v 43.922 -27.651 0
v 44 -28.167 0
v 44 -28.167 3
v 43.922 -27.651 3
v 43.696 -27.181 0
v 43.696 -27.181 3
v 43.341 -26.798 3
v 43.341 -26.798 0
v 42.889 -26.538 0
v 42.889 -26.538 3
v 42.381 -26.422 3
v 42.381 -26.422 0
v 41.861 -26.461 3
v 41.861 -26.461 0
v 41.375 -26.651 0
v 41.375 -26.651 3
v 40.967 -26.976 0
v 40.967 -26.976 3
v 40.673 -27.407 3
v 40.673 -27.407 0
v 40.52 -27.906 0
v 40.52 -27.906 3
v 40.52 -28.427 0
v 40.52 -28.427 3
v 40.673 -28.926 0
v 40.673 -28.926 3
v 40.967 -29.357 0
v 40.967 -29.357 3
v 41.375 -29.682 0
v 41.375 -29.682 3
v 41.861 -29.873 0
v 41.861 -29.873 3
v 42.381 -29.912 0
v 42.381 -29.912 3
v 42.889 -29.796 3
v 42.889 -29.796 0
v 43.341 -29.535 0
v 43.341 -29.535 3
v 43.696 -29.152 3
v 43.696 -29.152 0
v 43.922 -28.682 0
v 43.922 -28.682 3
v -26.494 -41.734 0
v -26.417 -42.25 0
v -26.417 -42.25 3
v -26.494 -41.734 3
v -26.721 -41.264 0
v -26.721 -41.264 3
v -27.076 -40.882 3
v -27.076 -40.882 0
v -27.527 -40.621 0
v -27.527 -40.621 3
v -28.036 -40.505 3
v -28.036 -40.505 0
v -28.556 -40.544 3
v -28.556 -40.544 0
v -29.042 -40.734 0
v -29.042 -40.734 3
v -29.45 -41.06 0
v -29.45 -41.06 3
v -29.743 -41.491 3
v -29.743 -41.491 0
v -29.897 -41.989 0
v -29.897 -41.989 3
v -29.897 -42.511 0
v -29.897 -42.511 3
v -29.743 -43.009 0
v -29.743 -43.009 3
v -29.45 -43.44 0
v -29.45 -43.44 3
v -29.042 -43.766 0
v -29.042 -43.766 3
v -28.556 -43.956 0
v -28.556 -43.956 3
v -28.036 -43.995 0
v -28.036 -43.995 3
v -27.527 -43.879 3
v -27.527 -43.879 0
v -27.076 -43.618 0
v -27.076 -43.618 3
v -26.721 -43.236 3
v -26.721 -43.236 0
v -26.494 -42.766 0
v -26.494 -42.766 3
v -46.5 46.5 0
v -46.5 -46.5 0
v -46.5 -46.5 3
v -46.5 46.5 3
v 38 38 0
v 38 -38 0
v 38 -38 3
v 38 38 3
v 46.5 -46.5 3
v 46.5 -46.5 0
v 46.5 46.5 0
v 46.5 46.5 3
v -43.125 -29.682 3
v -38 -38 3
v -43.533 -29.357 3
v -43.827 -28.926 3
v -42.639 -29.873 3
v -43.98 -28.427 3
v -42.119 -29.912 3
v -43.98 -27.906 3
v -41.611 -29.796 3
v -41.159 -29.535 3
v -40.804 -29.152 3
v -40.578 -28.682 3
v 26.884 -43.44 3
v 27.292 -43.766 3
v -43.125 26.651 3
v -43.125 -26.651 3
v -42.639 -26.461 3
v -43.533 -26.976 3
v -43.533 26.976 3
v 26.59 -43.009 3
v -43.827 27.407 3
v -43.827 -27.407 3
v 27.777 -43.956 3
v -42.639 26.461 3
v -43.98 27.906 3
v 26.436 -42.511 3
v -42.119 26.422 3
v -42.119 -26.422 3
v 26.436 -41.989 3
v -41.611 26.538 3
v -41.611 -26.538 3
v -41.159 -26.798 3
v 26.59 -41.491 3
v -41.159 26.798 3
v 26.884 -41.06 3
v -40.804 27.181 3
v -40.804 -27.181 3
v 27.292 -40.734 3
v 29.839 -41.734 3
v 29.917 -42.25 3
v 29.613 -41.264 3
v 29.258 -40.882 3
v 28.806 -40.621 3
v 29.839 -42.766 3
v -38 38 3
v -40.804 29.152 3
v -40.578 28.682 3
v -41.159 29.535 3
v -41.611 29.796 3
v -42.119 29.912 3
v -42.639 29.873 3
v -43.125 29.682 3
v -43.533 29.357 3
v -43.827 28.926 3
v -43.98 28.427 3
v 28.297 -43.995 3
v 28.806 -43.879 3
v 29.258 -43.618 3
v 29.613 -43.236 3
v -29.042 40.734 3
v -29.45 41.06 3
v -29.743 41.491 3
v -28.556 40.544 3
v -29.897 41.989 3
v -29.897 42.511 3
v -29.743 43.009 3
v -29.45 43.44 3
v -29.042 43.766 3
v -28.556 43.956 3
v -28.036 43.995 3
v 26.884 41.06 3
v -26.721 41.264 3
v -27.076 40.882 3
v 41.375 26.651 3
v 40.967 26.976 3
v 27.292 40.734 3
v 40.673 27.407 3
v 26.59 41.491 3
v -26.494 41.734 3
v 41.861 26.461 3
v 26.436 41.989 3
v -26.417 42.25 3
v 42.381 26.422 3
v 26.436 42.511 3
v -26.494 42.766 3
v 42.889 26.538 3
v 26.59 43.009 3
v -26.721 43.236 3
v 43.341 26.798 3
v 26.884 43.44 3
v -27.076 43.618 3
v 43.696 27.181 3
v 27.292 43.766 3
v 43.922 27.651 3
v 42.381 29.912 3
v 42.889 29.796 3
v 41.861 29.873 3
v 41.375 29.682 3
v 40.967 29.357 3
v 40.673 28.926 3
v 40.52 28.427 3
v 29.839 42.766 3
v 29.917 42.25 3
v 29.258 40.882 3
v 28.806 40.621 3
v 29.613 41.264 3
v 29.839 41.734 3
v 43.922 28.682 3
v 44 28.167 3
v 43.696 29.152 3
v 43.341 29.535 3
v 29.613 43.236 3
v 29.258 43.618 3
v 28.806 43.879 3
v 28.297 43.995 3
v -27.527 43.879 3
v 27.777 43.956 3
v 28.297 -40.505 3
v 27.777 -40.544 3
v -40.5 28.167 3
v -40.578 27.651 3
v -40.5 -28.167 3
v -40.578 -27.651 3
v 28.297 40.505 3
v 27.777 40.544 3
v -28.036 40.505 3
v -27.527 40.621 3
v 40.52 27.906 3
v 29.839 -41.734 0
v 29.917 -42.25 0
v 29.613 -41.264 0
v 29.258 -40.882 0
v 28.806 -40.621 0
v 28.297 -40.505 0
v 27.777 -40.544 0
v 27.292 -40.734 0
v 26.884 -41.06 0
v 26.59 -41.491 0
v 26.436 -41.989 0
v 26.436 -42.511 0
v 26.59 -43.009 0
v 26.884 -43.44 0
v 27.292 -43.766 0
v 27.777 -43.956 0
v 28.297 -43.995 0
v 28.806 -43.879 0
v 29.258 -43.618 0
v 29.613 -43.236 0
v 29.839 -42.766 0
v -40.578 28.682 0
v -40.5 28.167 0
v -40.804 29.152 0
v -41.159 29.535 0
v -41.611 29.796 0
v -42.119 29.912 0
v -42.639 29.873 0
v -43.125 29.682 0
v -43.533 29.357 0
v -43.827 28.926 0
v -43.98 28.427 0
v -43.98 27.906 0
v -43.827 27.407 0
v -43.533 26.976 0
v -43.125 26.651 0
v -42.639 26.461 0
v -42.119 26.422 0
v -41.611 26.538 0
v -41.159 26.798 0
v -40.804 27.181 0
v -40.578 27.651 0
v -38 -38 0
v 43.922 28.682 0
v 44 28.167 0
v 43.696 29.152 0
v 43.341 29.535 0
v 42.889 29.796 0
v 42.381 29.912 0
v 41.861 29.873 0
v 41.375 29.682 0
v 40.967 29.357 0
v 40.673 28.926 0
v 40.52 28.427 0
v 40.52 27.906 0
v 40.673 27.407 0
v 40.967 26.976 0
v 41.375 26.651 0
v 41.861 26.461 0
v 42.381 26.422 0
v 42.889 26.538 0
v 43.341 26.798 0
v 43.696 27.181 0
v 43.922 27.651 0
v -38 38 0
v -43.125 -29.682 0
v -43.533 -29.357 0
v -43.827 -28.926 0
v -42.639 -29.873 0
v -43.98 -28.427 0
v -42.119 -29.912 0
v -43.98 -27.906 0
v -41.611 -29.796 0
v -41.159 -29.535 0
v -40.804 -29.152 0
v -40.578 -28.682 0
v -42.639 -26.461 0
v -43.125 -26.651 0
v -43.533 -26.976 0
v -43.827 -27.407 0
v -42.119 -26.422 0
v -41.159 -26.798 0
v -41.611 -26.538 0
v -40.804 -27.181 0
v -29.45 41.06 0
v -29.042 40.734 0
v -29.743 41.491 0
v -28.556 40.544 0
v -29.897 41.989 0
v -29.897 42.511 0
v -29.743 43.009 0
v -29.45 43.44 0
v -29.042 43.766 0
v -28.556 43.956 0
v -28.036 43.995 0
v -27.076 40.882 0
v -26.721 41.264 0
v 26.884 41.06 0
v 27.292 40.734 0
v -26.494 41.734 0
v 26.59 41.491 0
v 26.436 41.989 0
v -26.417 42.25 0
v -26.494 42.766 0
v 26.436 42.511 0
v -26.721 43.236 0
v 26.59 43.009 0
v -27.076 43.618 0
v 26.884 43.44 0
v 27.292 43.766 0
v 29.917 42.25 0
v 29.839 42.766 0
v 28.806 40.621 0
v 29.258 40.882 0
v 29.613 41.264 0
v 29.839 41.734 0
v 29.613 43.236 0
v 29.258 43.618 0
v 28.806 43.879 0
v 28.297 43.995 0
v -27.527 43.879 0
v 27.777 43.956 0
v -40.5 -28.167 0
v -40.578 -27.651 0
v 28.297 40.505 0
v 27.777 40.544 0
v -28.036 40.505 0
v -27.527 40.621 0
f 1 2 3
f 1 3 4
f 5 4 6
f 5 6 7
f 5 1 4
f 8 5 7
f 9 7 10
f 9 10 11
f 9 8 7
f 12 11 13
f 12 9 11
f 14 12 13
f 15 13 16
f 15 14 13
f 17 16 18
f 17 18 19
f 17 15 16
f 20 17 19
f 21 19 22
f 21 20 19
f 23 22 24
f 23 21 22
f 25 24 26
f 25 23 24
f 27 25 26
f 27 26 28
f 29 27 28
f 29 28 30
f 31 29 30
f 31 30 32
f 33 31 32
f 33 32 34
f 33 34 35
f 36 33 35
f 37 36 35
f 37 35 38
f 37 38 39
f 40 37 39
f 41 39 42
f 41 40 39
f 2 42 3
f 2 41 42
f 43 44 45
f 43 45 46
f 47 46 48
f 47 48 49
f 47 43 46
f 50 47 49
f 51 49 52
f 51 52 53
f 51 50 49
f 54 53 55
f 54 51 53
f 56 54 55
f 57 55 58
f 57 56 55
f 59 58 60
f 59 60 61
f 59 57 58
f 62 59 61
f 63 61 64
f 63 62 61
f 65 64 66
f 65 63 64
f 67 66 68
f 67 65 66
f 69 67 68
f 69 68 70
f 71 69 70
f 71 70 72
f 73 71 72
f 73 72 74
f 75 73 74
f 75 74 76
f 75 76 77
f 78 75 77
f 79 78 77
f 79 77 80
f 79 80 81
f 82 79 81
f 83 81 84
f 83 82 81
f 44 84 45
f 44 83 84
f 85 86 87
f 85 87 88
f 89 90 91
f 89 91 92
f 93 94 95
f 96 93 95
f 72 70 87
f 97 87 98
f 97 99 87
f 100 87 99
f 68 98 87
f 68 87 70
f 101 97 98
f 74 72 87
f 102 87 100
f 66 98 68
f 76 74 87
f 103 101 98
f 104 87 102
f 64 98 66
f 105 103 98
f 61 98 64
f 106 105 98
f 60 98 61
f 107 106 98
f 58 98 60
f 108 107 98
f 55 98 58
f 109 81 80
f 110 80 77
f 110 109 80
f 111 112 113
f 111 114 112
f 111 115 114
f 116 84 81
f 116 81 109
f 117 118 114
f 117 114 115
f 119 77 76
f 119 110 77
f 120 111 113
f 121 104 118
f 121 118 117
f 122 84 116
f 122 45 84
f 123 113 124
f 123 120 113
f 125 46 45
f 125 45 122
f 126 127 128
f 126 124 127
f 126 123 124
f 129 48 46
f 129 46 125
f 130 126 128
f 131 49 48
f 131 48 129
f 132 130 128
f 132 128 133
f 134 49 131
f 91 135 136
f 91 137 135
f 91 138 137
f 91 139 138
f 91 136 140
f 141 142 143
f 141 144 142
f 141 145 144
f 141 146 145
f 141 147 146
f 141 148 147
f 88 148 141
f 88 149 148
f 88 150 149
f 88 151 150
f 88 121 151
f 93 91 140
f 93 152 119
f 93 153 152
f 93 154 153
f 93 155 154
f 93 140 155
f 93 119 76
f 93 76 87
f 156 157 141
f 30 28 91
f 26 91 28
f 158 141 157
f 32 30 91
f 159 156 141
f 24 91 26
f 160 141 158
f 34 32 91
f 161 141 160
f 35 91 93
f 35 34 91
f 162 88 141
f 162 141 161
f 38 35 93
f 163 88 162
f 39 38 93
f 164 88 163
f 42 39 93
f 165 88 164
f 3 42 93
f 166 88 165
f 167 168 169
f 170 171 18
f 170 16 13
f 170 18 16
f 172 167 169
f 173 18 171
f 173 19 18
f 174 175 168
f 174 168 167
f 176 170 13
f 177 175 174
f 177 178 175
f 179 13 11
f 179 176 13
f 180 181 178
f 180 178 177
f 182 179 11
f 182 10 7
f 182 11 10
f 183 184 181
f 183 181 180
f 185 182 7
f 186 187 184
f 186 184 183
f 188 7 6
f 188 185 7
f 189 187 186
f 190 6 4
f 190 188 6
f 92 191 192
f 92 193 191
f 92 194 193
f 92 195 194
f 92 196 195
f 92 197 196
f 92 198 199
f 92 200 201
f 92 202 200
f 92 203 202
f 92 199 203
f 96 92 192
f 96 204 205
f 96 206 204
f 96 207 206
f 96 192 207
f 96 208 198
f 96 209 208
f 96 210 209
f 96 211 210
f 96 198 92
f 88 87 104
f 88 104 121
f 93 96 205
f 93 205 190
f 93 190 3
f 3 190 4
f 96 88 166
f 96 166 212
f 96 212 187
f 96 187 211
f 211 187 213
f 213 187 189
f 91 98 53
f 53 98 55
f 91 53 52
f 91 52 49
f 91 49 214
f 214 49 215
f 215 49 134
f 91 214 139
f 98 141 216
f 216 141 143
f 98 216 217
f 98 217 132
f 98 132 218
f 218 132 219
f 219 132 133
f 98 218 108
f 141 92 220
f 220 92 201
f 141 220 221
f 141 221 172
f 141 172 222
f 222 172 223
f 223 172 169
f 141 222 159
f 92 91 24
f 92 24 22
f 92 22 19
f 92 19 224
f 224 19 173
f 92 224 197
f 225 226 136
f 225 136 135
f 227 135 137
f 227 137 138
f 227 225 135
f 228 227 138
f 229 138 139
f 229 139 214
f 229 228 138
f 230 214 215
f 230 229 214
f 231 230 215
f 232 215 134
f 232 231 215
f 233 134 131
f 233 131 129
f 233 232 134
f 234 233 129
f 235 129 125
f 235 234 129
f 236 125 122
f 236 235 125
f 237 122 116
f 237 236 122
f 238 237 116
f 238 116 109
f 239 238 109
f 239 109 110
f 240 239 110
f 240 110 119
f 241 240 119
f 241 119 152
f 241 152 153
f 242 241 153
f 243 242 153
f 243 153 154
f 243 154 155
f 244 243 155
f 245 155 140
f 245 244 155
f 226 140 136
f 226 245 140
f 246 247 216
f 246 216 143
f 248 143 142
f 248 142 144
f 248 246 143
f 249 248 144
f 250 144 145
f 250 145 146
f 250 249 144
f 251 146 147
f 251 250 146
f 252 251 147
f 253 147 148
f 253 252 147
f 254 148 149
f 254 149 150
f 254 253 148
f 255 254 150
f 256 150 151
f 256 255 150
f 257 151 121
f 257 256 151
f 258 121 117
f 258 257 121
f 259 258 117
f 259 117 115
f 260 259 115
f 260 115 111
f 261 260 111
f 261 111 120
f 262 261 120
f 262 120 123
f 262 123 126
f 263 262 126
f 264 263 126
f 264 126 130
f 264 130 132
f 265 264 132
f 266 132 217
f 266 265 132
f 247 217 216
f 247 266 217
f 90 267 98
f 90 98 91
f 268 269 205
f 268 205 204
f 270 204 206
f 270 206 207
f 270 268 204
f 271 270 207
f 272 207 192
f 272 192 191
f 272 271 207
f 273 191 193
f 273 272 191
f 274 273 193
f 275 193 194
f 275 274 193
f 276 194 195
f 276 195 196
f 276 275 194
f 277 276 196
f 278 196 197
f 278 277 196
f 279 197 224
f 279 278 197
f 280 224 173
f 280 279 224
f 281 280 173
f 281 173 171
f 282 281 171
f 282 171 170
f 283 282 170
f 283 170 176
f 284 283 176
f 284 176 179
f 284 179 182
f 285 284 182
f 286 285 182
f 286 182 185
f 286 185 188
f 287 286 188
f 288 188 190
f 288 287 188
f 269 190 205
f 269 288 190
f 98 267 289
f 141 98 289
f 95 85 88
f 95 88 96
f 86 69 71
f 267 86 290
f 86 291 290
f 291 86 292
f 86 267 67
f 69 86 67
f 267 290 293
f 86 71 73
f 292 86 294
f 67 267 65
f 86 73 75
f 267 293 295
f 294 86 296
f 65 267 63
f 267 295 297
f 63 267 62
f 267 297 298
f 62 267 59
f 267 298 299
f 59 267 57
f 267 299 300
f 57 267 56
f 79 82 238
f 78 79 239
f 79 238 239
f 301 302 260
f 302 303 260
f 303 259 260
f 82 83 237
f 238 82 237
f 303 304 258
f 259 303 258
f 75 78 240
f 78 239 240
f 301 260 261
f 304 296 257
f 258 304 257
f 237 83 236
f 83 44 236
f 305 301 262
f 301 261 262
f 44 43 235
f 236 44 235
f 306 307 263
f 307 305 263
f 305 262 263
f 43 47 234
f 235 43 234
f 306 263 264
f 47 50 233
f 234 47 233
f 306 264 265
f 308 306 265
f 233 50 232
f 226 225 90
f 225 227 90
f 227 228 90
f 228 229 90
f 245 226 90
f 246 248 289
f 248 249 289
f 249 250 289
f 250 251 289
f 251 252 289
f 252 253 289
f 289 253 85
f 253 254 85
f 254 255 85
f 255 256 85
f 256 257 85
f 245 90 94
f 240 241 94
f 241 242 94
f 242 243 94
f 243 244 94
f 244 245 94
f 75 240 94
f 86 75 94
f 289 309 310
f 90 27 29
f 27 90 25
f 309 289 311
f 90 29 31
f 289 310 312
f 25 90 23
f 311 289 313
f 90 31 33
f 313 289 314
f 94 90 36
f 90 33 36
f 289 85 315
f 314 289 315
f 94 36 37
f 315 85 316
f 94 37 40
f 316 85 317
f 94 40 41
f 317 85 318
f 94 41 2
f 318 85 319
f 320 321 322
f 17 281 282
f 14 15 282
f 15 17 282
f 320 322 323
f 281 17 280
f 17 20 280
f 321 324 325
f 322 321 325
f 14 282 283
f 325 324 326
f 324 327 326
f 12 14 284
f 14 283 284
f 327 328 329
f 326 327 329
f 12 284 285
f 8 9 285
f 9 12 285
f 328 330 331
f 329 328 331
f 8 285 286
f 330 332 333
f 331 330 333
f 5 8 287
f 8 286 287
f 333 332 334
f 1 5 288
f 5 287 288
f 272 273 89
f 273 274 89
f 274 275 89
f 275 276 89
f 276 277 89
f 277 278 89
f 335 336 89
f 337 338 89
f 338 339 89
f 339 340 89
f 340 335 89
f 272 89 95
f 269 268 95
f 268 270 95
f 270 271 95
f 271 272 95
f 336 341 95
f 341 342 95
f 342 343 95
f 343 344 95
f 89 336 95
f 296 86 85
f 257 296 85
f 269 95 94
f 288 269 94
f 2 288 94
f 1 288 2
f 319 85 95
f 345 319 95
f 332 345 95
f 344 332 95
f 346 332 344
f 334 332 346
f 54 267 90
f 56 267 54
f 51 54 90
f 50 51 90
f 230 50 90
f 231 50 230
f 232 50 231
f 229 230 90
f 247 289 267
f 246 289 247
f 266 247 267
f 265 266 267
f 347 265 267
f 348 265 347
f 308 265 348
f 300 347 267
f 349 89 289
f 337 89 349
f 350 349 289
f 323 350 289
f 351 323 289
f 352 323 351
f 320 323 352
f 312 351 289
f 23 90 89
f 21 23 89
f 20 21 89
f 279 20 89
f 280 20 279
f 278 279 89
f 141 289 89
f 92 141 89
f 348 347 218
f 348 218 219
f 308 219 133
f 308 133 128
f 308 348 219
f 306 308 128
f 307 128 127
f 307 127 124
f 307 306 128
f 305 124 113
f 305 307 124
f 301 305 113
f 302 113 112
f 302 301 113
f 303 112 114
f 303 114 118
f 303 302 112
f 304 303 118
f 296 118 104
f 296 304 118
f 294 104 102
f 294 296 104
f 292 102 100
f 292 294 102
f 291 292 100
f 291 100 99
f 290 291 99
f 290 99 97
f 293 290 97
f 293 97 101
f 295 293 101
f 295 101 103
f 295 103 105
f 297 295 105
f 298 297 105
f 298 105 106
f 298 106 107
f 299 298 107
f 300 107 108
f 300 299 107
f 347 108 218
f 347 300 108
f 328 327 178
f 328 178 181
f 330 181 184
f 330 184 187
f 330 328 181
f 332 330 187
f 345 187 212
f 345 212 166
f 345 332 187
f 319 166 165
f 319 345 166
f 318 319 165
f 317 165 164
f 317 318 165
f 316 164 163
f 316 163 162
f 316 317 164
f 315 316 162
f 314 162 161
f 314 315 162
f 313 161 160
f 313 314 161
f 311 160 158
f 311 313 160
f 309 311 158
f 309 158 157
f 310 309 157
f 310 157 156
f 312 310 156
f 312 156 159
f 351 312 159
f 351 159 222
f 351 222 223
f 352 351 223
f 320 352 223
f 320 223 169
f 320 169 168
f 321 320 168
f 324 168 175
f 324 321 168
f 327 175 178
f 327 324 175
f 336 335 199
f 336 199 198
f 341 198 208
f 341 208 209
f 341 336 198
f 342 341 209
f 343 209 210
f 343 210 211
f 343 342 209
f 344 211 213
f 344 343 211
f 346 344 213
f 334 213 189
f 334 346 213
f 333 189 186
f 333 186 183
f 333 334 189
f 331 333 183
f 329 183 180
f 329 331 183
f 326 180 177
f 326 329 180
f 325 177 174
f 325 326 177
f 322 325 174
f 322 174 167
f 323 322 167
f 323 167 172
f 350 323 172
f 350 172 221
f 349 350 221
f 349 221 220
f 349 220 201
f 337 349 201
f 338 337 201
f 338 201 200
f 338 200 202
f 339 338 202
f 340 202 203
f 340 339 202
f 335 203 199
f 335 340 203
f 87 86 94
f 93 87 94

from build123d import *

# Parameters (mm, degrees)
SKETCH_W   = 93
SKETCH_H   = 93
SKETCH_R   = 1.75
SKETCH_W_2 = 76
SKETCH_H_2 = 76
PAD_DEPTH  = 3


with BuildPart() as part:
    # Sketch → Pad (new body)
    with BuildSketch(Plane.XY):
        Rectangle(SKETCH_W, SKETCH_H)
        with Locations((-28.166667, 42.25)):
            Circle(SKETCH_R, mode=Mode.SUBTRACT)
        with Locations((28.166667, 42.25)):
            Circle(SKETCH_R, mode=Mode.SUBTRACT)
        with Locations((42.25, 28.166667)):
            Circle(SKETCH_R, mode=Mode.SUBTRACT)
        with Locations((42.25, -28.166667)):
            Circle(SKETCH_R, mode=Mode.SUBTRACT)
        with Locations((28.166667, -42.25)):
            Circle(SKETCH_R, mode=Mode.SUBTRACT)
        with Locations((-28.166667, -42.25)):
            Circle(SKETCH_R, mode=Mode.SUBTRACT)
        with Locations((-42.25, -28.166667)):
            Circle(SKETCH_R, mode=Mode.SUBTRACT)
        with Locations((-42.25, 28.166667)):
            Circle(SKETCH_R, mode=Mode.SUBTRACT)
        Rectangle(SKETCH_W_2, SKETCH_H_2, mode=Mode.SUBTRACT)
    extrude(amount=PAD_DEPTH)


solid = part.part
